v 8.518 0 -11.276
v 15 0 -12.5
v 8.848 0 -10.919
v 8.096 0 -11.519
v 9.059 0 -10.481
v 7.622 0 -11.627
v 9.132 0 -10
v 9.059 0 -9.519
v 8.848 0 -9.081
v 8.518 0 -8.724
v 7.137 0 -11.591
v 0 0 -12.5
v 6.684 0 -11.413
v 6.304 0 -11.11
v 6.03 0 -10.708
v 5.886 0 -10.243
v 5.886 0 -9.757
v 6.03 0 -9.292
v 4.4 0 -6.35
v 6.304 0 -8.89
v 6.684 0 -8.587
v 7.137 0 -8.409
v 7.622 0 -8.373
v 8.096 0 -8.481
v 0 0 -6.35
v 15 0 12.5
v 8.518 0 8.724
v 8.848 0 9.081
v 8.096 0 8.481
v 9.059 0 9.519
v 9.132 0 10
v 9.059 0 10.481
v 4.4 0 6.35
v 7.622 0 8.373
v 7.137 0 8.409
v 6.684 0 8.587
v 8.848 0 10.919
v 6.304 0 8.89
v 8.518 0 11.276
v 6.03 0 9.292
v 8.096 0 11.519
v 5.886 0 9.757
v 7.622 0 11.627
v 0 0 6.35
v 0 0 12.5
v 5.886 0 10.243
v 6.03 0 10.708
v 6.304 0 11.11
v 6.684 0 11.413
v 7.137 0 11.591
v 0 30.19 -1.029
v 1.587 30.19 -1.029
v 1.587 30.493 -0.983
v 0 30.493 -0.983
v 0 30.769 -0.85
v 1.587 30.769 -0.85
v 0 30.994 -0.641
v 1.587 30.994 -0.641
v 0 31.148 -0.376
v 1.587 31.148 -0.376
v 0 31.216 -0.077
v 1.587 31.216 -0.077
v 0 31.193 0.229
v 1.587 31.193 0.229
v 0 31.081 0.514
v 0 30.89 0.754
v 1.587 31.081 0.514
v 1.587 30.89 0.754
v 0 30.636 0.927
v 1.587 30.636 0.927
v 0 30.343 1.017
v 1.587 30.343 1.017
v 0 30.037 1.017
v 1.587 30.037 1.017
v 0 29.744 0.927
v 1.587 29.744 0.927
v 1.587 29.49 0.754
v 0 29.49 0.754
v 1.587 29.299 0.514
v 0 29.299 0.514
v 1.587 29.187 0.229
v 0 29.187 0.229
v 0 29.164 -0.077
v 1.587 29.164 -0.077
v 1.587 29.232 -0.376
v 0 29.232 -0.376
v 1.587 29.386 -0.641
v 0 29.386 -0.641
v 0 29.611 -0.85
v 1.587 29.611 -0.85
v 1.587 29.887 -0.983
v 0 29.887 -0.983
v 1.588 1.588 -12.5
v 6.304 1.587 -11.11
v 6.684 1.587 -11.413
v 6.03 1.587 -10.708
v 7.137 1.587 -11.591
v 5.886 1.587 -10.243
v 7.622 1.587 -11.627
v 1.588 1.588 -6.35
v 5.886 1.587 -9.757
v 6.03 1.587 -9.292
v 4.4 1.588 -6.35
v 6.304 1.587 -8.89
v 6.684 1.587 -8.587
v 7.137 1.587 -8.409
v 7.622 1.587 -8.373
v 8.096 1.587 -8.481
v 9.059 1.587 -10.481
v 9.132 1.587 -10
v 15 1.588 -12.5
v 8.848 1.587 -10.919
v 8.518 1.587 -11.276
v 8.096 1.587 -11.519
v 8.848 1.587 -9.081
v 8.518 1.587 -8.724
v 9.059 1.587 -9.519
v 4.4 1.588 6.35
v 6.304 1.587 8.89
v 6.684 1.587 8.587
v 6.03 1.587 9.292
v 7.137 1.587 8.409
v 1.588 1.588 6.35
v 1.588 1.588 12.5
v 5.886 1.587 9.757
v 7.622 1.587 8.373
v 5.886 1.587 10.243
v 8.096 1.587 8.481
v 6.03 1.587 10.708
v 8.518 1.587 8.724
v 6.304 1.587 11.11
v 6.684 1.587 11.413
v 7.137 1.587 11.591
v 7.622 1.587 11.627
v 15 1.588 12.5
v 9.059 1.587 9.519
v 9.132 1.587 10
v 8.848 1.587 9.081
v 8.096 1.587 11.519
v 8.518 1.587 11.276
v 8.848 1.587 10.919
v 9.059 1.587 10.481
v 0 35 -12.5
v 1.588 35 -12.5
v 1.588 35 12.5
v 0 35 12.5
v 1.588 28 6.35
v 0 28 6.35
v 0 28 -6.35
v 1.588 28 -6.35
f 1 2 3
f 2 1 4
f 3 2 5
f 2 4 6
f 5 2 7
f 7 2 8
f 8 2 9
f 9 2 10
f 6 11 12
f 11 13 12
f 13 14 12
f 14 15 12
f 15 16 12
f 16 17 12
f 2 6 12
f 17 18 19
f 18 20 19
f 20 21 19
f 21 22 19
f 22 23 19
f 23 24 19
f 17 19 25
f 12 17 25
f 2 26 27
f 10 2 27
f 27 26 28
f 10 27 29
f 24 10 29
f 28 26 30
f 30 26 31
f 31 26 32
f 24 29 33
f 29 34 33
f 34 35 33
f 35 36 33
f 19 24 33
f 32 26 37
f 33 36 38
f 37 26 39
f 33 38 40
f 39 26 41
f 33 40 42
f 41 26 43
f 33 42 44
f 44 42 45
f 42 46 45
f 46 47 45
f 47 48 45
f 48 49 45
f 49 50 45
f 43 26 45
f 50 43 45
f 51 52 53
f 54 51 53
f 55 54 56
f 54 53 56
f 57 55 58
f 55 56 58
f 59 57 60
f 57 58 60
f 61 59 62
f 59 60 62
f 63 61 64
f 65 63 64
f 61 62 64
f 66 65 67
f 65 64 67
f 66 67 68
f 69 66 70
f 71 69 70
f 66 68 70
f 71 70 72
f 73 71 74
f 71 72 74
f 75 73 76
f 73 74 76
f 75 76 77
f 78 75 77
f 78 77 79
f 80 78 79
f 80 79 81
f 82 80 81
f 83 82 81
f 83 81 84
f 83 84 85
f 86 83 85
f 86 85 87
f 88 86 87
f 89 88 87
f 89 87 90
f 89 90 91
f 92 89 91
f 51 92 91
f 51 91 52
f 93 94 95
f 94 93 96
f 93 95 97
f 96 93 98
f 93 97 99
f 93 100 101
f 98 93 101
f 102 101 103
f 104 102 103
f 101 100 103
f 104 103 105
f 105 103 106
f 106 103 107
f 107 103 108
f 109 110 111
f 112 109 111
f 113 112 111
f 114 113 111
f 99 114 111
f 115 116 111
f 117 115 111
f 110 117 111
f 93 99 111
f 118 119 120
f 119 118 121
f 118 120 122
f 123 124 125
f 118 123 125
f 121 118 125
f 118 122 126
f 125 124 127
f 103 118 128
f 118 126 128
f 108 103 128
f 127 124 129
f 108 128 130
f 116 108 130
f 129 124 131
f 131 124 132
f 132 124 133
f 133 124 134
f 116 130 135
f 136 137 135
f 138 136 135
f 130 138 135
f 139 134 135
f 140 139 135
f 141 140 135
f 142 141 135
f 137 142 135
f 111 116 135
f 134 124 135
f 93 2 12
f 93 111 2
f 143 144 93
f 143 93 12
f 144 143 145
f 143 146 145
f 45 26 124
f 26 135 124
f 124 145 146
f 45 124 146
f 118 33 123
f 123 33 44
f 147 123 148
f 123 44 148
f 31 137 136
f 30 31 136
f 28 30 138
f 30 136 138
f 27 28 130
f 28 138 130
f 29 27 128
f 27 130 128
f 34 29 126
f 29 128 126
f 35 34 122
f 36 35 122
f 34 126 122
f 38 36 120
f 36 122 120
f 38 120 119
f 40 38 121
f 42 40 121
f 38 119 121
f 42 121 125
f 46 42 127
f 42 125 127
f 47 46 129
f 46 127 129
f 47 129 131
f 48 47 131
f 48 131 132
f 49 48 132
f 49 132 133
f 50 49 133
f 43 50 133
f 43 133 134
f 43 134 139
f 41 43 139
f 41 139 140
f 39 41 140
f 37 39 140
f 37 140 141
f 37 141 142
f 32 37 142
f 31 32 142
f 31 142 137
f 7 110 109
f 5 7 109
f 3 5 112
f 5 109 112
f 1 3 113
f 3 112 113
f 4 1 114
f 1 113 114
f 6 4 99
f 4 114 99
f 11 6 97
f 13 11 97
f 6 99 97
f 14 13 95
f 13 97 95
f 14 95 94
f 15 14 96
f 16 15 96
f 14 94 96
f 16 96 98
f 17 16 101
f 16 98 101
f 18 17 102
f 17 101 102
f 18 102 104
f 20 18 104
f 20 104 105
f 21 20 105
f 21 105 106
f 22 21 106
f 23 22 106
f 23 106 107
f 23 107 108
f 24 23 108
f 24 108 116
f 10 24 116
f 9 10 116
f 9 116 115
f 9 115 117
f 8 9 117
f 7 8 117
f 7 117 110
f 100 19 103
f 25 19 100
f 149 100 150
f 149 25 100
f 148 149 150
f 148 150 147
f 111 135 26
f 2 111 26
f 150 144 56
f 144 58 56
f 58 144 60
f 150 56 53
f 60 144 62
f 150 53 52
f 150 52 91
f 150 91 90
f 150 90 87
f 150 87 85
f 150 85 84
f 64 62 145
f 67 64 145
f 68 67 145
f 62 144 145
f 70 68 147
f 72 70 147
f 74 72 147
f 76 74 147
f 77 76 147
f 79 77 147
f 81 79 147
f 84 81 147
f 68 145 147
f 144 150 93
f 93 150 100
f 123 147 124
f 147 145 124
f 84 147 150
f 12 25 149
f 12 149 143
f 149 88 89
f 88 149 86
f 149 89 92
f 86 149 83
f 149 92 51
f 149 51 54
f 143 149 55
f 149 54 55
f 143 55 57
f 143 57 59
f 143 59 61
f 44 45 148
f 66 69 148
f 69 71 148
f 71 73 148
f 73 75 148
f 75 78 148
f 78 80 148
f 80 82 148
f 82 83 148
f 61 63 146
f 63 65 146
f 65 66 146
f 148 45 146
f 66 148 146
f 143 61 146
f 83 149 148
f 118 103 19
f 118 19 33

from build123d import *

# Parameters (mm, degrees)
BOSS_EXTRUDE1_DEPTH   = 12.5
F_4_CLEARANCE_HOLE1_D = 3.2639
F_1_CLEARANCE_HOLE1_D = 2.0574
SKETCH7_W             = 12.7
SKETCH7_H             = 28
CUT_EXTRUDE1_DEPTH    = 4.4


with BuildPart() as part:
    # Sketch1 → Boss-Extrude1 (new, symmetric)
    with BuildSketch(Plane.XY):
        Polygon((15, 0), (0, 0), (0, 35), (1.5875, 35), (1.5875, 1.5875), (15, 1.5875), align=None)
    extrude(amount=BOSS_EXTRUDE1_DEPTH, both=True)

    # #4 Clearance Hole1 (through all)
    with Locations(Plane(origin=(0, 0, 0), x_dir=(-1, 0, 0), z_dir=(0, -1, 0))):
        with Locations((-7.5, 10), (-7.5, -10)):
            Hole(F_4_CLEARANCE_HOLE1_D / 2)

    # #1 Clearance Hole1 (through all)
    with Locations(Plane.ZY):
        with Locations((0, 30.19)):
            Hole(F_1_CLEARANCE_HOLE1_D / 2)

    # Sketch7 → Cut-Extrude1 (cut)
    with BuildSketch(Plane.ZY):
        with Locations((0, 14)):
            Rectangle(SKETCH7_W, SKETCH7_H)
    extrude(amount=-CUT_EXTRUDE1_DEPTH, mode=Mode.SUBTRACT)


solid = part.part
